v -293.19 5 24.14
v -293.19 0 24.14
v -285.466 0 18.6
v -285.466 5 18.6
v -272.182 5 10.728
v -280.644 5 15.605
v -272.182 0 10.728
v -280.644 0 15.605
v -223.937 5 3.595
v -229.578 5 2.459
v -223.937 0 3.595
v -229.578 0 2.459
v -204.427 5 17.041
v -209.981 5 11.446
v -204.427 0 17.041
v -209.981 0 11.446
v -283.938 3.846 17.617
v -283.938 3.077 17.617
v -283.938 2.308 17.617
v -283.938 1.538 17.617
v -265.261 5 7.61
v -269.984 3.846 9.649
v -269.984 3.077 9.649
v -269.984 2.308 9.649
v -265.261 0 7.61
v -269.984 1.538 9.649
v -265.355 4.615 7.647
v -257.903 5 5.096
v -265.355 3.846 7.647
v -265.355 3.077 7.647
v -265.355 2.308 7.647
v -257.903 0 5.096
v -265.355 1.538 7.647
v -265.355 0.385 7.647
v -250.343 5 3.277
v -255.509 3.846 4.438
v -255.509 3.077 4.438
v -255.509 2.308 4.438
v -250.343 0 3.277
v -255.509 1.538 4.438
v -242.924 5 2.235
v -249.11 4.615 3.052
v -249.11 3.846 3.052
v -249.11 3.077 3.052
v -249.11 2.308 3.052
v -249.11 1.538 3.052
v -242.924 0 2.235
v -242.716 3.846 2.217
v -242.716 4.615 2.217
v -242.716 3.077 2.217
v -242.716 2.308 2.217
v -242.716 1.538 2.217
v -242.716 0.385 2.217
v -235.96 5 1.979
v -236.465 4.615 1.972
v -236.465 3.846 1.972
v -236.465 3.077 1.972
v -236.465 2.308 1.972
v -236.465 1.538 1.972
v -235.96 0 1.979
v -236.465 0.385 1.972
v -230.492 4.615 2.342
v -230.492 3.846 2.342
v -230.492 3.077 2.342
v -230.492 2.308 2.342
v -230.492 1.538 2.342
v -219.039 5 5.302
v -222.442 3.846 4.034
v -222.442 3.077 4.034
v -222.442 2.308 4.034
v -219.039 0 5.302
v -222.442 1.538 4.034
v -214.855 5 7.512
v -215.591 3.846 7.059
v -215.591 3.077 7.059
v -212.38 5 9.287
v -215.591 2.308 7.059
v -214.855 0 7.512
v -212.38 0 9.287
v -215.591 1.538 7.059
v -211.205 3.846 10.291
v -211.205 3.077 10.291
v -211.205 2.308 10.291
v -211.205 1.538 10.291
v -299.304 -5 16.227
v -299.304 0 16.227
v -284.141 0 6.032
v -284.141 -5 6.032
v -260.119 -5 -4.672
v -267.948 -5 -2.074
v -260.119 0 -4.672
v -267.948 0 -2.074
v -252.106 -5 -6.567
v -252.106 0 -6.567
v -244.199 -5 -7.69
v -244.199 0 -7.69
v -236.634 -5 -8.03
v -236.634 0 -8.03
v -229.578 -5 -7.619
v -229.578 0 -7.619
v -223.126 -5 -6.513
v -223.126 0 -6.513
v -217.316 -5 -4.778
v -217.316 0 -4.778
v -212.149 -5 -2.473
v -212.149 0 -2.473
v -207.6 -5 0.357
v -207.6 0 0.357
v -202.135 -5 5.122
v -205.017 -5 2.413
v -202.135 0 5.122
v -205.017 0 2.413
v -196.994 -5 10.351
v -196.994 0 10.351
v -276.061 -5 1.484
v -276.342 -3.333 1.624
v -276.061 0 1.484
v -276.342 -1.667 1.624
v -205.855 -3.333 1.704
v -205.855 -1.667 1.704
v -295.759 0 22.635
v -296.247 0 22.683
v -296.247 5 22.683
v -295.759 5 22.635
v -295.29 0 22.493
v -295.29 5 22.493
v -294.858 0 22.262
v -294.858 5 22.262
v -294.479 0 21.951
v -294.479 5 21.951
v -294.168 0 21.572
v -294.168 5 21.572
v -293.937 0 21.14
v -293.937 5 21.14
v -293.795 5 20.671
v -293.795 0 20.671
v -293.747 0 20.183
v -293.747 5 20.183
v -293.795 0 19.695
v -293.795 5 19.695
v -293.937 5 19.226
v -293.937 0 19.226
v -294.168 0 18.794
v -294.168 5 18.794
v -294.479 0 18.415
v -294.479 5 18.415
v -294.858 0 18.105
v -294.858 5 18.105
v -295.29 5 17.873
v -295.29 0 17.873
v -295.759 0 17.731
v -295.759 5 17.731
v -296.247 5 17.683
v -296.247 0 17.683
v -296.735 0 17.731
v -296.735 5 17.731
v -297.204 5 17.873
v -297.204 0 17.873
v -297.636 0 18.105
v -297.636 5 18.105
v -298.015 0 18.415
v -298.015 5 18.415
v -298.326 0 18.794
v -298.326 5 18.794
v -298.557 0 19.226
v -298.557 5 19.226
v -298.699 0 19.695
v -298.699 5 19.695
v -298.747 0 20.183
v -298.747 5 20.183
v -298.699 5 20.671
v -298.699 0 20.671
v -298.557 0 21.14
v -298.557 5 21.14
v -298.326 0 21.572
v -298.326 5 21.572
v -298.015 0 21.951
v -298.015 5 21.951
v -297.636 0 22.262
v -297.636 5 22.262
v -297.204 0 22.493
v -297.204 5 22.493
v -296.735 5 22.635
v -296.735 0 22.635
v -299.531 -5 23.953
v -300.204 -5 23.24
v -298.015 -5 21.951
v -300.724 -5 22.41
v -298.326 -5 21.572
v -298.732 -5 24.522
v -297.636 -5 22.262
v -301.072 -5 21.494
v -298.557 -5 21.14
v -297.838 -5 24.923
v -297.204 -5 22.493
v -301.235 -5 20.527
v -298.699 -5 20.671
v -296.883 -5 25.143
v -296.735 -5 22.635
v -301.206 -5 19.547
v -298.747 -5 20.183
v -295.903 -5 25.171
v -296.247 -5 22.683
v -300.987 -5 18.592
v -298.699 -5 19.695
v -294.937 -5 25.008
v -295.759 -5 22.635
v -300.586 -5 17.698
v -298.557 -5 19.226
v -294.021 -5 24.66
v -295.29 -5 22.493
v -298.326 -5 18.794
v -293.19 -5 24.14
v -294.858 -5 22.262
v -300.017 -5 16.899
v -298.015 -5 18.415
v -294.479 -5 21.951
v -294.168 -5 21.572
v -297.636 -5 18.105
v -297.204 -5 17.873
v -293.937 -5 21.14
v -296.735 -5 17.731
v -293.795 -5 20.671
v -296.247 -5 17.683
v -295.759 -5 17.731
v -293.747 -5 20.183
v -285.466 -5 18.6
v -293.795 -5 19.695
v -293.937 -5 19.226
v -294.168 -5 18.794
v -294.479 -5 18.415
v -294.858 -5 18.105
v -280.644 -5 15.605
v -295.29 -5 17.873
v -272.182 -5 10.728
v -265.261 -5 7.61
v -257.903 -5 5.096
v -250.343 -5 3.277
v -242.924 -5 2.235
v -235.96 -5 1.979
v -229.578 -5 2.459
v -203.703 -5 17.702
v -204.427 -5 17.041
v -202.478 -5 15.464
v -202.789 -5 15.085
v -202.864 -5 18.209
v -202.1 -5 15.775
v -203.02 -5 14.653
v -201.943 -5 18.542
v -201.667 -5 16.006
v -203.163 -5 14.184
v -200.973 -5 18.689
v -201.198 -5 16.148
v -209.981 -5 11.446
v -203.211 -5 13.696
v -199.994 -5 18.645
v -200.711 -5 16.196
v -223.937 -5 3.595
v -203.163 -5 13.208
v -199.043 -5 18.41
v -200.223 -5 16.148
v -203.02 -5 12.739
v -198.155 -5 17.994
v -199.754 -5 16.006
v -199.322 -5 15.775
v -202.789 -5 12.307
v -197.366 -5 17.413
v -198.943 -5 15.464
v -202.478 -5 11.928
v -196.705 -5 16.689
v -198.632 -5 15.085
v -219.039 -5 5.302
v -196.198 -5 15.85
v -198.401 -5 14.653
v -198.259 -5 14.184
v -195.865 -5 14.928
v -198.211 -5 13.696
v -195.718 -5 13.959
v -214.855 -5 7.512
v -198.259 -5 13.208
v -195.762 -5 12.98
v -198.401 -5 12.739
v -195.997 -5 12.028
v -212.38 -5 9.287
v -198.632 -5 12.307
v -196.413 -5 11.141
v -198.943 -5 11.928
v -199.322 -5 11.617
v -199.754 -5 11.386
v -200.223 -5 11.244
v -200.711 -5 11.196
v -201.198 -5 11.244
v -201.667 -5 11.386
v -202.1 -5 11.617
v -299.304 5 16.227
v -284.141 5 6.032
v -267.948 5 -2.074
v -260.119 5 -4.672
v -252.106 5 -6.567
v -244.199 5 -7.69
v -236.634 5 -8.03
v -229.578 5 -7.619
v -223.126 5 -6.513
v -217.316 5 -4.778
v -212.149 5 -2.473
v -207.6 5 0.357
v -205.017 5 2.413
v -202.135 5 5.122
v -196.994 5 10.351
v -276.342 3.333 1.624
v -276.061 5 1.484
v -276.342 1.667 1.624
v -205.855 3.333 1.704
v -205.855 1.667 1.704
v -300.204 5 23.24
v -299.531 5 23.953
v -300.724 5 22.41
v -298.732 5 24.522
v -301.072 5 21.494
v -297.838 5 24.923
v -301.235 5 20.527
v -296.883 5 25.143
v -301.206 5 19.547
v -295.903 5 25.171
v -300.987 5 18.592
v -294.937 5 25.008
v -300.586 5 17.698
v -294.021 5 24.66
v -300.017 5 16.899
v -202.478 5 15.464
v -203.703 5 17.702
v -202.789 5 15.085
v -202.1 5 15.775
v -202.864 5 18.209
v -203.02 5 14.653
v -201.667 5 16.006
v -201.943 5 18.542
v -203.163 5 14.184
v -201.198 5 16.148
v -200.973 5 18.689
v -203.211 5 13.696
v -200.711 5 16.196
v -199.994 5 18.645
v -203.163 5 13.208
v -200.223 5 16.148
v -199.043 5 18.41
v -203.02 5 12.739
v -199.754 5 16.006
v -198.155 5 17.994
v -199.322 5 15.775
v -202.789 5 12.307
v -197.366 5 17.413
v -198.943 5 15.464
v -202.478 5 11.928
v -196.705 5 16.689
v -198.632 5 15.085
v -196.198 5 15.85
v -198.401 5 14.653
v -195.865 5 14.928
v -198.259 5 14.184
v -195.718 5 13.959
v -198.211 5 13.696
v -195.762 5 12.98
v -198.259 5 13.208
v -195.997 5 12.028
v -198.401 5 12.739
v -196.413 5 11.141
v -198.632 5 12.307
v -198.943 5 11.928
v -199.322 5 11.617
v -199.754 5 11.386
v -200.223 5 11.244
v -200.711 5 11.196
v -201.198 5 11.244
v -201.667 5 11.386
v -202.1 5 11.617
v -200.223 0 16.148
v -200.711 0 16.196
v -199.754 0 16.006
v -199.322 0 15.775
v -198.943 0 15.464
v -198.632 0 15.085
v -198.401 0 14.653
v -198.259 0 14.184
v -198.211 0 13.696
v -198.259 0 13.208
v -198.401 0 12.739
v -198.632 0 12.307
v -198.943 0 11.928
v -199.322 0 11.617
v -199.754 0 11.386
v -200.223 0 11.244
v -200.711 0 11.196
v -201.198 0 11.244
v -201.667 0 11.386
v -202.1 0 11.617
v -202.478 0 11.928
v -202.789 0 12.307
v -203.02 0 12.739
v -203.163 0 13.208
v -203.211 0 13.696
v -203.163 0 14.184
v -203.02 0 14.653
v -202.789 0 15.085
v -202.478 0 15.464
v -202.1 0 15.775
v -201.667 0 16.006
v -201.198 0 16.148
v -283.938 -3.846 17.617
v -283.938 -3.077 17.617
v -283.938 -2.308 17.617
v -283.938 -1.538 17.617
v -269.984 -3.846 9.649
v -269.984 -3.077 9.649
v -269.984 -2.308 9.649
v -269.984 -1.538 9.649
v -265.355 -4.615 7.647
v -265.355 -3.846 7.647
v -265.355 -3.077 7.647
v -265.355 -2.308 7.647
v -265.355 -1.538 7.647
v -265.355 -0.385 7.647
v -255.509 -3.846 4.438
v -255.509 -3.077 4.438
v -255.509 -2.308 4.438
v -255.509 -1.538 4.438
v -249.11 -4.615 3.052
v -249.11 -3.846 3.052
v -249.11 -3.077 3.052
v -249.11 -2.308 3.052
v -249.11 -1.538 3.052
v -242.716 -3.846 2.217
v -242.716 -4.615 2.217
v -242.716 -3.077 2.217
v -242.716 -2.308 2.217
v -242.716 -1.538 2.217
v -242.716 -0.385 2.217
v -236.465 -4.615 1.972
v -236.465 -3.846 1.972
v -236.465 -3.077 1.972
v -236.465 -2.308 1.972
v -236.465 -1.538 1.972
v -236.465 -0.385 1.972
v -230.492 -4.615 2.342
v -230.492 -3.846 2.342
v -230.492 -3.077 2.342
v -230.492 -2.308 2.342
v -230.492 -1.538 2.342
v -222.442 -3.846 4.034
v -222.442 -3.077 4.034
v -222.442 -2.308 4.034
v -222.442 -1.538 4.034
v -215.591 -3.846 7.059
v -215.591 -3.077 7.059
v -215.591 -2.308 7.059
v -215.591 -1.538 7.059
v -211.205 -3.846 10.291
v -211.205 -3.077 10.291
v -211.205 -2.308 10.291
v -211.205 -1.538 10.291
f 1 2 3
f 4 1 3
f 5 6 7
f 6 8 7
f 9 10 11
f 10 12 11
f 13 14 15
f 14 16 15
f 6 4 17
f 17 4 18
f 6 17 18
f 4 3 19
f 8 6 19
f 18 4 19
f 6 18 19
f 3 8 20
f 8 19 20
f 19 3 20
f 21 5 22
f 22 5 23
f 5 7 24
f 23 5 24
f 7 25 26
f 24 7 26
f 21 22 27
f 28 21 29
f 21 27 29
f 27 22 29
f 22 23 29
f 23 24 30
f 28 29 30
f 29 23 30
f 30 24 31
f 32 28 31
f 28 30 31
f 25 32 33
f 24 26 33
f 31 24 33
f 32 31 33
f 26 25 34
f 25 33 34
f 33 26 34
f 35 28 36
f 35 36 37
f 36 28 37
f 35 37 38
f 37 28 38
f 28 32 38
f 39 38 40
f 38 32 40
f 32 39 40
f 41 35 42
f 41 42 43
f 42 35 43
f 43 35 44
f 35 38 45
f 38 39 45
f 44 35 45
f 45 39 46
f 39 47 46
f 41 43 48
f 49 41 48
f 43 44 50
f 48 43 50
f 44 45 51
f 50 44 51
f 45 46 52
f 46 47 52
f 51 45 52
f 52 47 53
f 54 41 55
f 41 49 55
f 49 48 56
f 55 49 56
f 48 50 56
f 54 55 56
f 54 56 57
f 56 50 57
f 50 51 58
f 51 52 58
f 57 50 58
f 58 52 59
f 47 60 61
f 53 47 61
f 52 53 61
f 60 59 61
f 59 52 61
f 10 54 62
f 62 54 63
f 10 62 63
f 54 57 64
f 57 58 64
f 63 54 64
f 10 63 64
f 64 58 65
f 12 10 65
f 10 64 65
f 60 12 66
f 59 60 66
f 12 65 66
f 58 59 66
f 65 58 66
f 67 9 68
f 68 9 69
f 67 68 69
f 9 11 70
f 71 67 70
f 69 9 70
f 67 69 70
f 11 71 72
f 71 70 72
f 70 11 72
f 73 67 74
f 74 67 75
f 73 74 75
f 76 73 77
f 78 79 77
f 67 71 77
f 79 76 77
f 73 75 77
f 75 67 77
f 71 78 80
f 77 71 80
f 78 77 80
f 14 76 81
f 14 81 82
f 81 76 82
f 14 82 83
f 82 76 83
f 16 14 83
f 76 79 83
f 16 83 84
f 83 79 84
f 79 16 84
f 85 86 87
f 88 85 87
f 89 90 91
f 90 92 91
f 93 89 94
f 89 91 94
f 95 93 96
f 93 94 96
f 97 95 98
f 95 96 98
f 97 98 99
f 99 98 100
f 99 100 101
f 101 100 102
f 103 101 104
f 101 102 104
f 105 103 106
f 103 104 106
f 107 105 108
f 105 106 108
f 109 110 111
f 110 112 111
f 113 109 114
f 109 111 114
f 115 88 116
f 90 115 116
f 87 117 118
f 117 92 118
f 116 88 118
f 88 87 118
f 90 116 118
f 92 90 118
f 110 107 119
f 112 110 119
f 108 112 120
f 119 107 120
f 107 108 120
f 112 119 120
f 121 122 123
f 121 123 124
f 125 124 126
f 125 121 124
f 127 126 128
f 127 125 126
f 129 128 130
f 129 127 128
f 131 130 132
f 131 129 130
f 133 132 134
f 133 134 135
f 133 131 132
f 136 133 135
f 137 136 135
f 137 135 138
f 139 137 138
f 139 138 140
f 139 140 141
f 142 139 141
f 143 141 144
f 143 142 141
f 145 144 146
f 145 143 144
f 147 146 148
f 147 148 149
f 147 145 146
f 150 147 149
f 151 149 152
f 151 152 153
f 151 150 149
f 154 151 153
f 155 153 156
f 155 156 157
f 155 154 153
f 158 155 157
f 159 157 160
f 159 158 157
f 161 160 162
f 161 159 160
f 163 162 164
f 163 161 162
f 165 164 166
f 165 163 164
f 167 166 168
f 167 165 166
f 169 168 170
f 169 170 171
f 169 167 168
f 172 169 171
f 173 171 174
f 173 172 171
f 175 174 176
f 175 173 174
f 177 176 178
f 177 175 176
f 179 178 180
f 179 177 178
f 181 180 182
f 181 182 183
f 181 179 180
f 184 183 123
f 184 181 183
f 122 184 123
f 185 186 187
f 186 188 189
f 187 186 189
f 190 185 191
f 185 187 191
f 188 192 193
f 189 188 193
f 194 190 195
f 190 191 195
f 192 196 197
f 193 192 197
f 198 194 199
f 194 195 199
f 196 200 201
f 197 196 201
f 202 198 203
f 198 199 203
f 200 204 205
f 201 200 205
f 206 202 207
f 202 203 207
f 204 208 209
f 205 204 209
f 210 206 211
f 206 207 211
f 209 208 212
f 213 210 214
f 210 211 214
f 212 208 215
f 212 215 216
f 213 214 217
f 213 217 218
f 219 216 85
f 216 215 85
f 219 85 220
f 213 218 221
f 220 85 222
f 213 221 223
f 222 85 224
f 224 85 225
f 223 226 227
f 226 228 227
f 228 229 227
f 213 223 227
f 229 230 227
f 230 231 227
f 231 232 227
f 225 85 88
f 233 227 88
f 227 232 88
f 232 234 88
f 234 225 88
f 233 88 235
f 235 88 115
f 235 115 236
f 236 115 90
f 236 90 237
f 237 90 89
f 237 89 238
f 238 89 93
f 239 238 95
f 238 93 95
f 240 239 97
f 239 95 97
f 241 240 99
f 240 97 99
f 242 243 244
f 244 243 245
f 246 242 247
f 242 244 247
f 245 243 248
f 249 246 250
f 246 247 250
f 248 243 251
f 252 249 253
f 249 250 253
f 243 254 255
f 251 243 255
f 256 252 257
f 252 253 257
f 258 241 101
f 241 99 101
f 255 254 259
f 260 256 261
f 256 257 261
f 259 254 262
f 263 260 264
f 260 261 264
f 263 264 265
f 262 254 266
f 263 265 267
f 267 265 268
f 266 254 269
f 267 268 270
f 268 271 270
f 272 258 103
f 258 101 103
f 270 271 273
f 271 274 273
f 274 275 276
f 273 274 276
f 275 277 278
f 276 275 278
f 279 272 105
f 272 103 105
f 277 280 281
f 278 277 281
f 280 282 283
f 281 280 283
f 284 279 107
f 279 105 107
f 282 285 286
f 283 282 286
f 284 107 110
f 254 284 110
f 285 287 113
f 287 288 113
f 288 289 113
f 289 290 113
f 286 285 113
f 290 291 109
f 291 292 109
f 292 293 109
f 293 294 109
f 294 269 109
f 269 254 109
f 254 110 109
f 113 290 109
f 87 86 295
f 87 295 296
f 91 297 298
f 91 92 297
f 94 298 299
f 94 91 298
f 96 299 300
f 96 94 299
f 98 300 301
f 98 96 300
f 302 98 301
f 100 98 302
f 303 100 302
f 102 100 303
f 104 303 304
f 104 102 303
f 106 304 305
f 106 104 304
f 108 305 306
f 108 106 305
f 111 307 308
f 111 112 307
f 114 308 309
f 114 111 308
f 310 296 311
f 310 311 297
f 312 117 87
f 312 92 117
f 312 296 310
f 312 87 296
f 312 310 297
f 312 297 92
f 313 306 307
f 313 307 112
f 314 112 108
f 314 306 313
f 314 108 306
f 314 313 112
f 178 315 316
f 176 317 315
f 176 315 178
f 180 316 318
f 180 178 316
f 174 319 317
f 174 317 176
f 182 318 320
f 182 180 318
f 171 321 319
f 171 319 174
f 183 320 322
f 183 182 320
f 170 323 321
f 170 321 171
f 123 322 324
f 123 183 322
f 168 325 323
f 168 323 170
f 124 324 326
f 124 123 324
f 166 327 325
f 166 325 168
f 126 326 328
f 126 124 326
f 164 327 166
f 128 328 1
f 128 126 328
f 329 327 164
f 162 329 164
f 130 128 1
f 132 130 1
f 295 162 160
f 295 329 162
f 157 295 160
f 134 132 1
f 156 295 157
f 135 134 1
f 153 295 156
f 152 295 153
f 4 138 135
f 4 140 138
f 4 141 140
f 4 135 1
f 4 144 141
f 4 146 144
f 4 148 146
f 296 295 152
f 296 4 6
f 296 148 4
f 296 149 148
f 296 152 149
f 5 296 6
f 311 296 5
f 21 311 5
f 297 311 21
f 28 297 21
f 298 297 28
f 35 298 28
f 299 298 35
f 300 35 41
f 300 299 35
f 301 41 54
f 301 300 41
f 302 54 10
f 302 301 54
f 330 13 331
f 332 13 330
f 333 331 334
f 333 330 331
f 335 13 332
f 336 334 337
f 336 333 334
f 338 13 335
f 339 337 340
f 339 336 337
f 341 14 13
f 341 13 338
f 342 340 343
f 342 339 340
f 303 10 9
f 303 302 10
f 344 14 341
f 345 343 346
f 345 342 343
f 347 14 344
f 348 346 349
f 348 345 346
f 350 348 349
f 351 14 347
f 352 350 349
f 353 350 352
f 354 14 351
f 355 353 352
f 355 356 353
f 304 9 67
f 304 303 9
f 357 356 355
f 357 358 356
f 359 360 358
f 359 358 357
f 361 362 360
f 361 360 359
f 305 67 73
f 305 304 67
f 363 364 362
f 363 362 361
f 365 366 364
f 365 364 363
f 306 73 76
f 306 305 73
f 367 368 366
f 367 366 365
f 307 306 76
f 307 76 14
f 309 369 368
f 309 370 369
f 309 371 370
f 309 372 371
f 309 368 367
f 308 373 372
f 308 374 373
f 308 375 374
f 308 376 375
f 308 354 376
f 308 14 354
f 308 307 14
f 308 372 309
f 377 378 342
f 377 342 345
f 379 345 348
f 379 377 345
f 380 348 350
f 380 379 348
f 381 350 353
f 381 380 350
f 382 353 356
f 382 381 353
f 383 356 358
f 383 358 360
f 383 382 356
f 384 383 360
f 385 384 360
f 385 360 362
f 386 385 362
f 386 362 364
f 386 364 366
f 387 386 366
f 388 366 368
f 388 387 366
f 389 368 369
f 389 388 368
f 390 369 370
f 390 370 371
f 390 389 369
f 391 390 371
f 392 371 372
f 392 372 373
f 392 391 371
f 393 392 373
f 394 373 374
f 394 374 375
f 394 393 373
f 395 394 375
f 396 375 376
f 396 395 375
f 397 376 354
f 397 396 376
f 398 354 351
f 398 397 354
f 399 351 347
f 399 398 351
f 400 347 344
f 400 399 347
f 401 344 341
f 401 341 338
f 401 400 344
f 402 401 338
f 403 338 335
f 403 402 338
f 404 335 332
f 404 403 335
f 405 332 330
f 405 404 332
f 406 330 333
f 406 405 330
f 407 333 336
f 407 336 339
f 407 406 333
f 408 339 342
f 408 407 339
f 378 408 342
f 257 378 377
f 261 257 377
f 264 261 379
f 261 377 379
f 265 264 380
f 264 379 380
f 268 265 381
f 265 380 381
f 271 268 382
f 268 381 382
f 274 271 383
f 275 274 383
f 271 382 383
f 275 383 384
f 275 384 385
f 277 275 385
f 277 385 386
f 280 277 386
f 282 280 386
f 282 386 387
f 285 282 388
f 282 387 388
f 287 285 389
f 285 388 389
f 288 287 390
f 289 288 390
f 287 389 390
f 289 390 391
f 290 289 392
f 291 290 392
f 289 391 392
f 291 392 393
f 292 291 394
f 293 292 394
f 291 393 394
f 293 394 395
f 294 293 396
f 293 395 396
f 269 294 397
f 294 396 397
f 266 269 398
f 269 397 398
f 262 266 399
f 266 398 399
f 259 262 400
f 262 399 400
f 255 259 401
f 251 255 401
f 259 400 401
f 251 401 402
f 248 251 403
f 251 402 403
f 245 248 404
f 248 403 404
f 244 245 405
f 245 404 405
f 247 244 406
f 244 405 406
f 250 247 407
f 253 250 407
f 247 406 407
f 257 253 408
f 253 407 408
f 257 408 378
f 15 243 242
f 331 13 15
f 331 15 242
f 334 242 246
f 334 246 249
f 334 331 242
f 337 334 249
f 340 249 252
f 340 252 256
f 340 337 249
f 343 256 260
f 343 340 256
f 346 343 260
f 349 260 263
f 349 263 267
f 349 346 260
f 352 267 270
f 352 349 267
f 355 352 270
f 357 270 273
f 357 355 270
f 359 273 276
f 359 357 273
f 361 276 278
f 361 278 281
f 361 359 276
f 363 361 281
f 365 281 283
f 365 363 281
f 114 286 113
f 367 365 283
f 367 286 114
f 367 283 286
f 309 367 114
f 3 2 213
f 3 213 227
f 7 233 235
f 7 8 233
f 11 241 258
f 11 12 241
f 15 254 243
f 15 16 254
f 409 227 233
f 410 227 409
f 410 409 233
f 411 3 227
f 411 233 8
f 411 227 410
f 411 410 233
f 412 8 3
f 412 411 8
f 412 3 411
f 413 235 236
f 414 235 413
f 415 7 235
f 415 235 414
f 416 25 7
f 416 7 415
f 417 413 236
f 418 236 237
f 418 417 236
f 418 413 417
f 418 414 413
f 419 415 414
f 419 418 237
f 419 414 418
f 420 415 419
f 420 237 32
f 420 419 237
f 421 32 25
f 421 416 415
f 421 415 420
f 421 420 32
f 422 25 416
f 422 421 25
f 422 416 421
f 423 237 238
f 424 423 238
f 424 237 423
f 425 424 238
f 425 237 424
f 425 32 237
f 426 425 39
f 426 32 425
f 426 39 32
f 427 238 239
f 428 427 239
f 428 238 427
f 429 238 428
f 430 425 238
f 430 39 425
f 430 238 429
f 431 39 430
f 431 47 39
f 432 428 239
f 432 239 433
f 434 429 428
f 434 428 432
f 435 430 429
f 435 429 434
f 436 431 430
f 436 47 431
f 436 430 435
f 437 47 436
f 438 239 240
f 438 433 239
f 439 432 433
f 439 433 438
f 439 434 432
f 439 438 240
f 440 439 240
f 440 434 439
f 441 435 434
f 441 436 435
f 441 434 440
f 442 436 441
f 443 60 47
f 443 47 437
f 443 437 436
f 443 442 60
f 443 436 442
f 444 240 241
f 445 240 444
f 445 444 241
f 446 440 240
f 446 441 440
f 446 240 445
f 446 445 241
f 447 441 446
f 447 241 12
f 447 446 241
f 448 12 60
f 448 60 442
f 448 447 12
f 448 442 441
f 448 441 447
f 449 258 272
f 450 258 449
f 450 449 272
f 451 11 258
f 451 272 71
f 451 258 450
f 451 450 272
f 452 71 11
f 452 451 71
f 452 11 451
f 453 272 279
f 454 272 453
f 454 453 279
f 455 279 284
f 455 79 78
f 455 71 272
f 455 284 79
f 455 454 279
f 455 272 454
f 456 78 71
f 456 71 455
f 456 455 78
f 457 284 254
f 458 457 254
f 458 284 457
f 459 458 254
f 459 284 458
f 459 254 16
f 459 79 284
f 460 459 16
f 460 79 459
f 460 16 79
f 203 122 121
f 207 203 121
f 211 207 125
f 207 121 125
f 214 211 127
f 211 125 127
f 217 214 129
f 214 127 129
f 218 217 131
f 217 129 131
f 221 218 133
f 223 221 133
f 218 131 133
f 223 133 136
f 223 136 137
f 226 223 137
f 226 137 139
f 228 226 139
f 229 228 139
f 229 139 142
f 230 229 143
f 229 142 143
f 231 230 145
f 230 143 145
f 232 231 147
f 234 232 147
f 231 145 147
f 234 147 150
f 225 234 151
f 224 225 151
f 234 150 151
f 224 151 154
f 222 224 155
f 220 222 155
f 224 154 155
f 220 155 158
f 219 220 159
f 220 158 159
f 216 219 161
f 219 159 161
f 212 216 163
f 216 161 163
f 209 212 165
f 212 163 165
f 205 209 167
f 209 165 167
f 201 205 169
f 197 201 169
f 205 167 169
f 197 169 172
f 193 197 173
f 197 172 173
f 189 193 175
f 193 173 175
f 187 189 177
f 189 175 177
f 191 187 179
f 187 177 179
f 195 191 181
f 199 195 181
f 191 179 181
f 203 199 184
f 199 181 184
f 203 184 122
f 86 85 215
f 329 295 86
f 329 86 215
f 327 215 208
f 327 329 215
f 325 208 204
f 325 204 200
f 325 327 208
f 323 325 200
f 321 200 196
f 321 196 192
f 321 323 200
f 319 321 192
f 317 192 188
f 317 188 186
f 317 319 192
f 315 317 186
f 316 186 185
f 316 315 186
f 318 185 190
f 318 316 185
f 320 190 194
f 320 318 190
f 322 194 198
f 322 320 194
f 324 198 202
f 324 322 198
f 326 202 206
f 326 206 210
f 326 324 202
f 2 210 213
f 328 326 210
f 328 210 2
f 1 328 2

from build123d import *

# Parameters (mm, degrees)
SKETCH3_R           = 2.5
BOSS_EXTRUDE1_DEPTH = 5


with BuildPart() as part:
    # Sketch3 → Boss-Extrude1 (new, symmetric)
    with BuildSketch(Plane(origin=(0, 0, 0), x_dir=(1, 0, 0), z_dir=(0, 1, 0))):
        with BuildLine():
            ThreePointArc((-299.304262271, -16.226721188), (-300.203551691, -23.240370633), (-293.189902246, -24.139660053))
            add(Edge.make_bspline(
                [(-293.189902246, -24.139660053), (-290.128839124, -22.152764654), (-286.786538548, -19.324569113), (-280.862415348, -15.772118685), (-277.679116824, -13.712833567), (-272.928108533, -11.095078383), (-271.482849503, -10.354977079), (-268.484875372, -8.943526758), (-266.938163872, -8.274068128), (-262.188625232, -6.393042897), (-258.876334977, -5.309399198), (-251.271297793, -3.340810571), (-246.946091648, -2.580398934), (-238.485670472, -1.8527763), (-234.351862704, -1.886732872), (-227.640002948, -2.679148904), (-224.938371935, -3.245106431), (-219.9462539, -4.822827696), (-217.657198787, -5.832393233), (-214.770366393, -7.547047403), (-213.983977581, -8.069354524), (-212.538495104, -9.142025189), (-211.885373774, -9.678435733), (-210.525303671, -10.902899744), (-209.829074095, -11.581843244), (-207.729080325, -13.751928889), (-205.990691886, -15.11177084), (-204.427137735, -17.040946949)],
                knots=[0.921170626, 0.921170626, 0.921170626, 0.921170626, 12.454240572, 12.454240572, 24.908481145, 24.908481145, 30.226790488, 30.226790488, 35.545099832, 35.545099832, 46.181718519, 46.181718519, 59.564678371, 59.564678371, 72.947638222, 72.947638222, 82.838572761, 82.838572761, 92.7295073, 92.7295073, 96.661223853, 96.661223853, 100.281277534, 100.281277534, 103.901331215, 103.901331215, 110.926910792, 110.926910792, 110.926910792, 110.926910792], degree=3))
            ThreePointArc((-204.427137735, -17.040946949), (-197.365842369, -17.412575466), (-196.994213851, -10.3512801))
            add(Edge.make_bspline(
                [(-299.304262271, -16.226721188), (-291.902418619, -11.239503023), (-266.277956185, 8.039114355), (-218.323545031, 13.623313869), (-199.941940379, -7.459509549), (-196.994213851, -10.3512801)],
                knots=[0.847787986, 0.847787986, 0.847787986, 0.847787986, 28.002368753, 98.488917849, 110.926910792, 110.926910792, 110.926910792, 110.926910792], degree=3))
        make_face()
        with Locations(Location((-296.247082258, -20.183190621, 0), (0, 0, 270))):
            Circle(SKETCH3_R, mode=Mode.SUBTRACT)
        with Locations(Location((-200.710675793, -13.696113524, 0), (0, 0, 270))):
            Circle(SKETCH3_R, mode=Mode.SUBTRACT)
    extrude(amount=BOSS_EXTRUDE1_DEPTH, both=True)


solid = part.part
